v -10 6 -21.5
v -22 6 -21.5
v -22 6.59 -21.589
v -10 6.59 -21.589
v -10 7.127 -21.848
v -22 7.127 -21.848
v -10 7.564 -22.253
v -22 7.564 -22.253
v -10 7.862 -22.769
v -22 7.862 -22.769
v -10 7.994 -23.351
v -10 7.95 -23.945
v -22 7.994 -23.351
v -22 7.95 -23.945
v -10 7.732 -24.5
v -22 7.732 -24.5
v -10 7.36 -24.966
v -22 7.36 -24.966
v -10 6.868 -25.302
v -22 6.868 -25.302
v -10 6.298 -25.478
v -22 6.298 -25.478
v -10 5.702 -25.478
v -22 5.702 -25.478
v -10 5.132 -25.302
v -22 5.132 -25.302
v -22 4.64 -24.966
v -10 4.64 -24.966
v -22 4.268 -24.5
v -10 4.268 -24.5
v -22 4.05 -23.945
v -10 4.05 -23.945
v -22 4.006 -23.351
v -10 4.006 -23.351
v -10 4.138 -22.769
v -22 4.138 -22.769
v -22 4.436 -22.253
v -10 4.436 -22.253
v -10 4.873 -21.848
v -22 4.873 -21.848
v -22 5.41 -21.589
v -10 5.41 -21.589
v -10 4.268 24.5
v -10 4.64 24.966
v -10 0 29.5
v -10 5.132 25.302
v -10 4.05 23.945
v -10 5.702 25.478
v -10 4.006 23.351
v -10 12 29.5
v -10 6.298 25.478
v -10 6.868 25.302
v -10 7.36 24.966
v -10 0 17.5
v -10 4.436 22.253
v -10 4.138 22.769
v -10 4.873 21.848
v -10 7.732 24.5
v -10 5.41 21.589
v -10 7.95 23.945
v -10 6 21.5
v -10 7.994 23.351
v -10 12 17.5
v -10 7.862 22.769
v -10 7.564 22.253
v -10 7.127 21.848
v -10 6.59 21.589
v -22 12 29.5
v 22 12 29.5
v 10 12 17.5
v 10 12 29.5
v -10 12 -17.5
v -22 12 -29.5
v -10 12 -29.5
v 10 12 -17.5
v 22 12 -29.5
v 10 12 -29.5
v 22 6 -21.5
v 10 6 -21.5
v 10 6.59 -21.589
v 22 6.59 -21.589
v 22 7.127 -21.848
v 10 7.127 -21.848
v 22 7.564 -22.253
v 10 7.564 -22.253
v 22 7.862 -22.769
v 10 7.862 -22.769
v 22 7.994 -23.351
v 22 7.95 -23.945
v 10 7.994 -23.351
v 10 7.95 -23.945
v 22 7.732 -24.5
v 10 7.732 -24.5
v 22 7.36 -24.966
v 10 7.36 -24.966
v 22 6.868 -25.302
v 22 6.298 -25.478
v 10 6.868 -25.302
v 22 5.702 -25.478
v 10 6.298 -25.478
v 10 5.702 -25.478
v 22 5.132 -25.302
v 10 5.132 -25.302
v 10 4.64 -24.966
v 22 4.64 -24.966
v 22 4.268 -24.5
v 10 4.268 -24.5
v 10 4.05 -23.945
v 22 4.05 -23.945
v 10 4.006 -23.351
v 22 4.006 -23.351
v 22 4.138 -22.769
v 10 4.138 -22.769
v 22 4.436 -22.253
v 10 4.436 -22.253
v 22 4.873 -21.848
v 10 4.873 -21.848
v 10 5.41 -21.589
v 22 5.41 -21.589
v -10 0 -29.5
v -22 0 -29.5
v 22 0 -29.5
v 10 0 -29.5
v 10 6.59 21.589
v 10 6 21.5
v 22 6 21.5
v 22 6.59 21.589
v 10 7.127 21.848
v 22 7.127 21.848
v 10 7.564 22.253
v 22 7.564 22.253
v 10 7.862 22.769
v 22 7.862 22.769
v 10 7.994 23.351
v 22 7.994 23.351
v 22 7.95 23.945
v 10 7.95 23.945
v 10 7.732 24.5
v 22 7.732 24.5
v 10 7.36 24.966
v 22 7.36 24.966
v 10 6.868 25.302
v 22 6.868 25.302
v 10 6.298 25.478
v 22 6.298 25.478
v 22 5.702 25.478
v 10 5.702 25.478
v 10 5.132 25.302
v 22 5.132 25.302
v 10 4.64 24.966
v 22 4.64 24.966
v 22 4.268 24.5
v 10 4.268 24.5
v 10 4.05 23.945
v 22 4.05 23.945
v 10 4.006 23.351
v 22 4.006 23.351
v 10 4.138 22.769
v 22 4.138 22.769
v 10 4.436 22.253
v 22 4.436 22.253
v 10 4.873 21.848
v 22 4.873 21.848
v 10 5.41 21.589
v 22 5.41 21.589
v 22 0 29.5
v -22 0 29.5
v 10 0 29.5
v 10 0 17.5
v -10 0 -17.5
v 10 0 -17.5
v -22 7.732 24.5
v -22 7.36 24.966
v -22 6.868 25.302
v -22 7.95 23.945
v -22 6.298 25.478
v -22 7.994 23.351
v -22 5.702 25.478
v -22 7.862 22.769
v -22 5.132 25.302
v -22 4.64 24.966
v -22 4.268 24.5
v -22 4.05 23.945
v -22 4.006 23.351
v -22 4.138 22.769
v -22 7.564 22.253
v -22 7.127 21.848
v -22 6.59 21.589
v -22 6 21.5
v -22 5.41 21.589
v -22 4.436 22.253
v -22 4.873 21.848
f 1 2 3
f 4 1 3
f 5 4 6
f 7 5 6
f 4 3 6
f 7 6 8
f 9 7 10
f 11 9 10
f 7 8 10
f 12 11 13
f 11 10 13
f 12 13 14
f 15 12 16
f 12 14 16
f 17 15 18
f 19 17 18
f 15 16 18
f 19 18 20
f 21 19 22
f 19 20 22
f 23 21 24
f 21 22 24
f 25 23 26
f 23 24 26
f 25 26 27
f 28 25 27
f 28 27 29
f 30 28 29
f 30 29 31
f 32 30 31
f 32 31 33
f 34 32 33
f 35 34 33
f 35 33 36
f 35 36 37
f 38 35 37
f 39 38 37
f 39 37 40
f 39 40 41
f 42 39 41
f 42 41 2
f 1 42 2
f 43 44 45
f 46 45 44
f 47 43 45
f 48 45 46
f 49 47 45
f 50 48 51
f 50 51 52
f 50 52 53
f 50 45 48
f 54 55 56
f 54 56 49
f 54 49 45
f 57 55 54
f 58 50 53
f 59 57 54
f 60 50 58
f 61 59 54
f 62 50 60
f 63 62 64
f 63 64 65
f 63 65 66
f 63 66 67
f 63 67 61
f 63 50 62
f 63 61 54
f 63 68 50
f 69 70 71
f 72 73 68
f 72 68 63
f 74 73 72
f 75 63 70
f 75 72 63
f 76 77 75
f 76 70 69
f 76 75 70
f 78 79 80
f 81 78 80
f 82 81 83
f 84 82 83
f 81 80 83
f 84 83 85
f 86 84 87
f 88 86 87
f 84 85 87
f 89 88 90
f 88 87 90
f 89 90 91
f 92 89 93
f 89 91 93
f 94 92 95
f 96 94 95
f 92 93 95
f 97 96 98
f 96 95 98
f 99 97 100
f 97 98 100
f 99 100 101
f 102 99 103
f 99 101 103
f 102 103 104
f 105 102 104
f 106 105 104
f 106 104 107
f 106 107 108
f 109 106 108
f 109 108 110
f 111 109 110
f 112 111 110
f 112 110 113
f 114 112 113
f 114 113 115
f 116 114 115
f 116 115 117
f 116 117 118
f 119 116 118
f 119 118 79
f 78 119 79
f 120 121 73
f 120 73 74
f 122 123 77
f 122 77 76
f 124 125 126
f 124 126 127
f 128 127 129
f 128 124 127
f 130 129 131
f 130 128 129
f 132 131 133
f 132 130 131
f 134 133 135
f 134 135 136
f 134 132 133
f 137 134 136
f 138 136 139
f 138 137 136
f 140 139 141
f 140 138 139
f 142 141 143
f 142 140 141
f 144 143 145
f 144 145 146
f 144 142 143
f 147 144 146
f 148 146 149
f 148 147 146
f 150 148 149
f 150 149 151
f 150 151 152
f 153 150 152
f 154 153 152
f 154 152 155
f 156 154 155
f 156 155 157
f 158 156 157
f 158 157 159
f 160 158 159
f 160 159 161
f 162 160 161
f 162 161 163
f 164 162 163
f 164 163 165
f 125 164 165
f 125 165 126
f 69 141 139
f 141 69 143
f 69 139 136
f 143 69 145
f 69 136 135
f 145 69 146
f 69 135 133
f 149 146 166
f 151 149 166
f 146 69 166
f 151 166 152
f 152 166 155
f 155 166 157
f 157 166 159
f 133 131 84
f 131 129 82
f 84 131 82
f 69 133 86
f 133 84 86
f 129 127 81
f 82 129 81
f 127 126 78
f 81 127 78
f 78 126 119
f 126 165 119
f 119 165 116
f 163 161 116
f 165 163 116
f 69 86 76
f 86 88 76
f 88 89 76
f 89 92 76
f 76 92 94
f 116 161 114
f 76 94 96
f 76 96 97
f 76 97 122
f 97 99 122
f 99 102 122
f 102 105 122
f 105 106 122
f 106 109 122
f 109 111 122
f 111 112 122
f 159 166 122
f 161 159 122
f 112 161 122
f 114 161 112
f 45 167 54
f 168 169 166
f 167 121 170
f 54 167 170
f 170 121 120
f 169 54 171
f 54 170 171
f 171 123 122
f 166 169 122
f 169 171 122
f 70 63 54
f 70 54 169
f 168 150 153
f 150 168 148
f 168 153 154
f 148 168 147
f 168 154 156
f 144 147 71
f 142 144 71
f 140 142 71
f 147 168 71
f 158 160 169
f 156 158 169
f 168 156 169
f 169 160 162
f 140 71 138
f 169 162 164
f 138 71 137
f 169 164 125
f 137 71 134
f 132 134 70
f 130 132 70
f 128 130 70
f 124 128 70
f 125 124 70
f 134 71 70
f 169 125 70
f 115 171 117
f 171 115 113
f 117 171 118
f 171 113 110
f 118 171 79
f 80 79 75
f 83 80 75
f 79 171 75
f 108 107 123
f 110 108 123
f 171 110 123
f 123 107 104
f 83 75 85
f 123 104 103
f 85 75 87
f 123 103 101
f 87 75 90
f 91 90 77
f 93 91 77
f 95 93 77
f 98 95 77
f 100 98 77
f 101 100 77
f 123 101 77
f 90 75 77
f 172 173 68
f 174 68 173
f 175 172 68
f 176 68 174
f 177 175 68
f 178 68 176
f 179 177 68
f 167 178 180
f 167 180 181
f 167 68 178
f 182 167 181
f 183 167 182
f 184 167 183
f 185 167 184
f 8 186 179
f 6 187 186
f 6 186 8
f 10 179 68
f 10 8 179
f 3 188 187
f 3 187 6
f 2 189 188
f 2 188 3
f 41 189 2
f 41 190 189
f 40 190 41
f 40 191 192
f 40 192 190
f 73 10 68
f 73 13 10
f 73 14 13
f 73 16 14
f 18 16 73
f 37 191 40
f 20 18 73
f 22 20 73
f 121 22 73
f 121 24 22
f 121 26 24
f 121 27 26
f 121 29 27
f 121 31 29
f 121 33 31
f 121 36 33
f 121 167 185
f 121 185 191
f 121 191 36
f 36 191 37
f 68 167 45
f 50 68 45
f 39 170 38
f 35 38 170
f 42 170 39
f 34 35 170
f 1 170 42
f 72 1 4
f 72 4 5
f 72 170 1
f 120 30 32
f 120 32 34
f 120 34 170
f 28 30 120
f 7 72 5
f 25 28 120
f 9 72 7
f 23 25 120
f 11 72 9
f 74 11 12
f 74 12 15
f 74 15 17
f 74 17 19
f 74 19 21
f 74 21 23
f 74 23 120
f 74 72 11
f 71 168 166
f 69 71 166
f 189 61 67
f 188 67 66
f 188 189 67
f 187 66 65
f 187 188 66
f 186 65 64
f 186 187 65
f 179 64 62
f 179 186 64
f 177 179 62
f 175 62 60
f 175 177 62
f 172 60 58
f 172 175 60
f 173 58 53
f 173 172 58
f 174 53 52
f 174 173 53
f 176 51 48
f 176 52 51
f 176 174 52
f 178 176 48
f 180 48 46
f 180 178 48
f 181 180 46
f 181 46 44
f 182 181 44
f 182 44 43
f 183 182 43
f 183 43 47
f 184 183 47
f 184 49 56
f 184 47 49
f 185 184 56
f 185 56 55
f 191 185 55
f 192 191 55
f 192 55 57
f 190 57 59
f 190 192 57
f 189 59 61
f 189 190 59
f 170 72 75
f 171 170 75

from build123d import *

# Parameters (mm, degrees)
SKETCH1_W           = 44
SKETCH1_H           = 59
BOSS_EXTRUDE1_DEPTH = 12
CUT_EXTRUDE1_REACH  = 40.707
SKETCH2_W           = 20
SKETCH2_H           = 12
CUT_EXTRUDE2_REACH  = 56.316
SKETCH3_R           = 2


with BuildPart() as part:
    # Sketch1 → Boss-Extrude1 (new body)
    with BuildSketch(Plane(origin=(0, 0, 0), x_dir=(1, 0, 0), z_dir=(0, 1, 0))):
        Rectangle(SKETCH1_W, SKETCH1_H)
    extrude(amount=BOSS_EXTRUDE1_DEPTH)

    # Sketch2 → Cut-Extrude1 (cut, up to next)
    with BuildSketch(Plane(origin=(0, 12, 0), x_dir=(1, 0, 0), z_dir=(0, 1, 0)), mode=Mode.PRIVATE) as cut_extrude1_sk1:
        with Locations((0, 23.5)):
            Rectangle(SKETCH2_W, SKETCH2_H)
    cut_extrude1_tool1 = extrude(cut_extrude1_sk1.sketch, amount=-CUT_EXTRUDE1_REACH, mode=Mode.PRIVATE) & part.part
    # Sketch2 → Cut-Extrude1 (cut, up to next)
    with BuildSketch(Plane(origin=(0, 12, 0), x_dir=(1, 0, 0), z_dir=(0, 1, 0)), mode=Mode.PRIVATE) as cut_extrude1_sk2:
        with Locations((0, -23.5)):
            Rectangle(SKETCH2_W, SKETCH2_H)
    cut_extrude1_tool2 = extrude(cut_extrude1_sk2.sketch, amount=-CUT_EXTRUDE1_REACH, mode=Mode.PRIVATE) & part.part
    add(cut_extrude1_tool1.solids().sort_by_distance((0, 12, -23.5))[0], mode=Mode.SUBTRACT)
    add(cut_extrude1_tool2.solids().sort_by_distance((0, 12, 23.5))[0], mode=Mode.SUBTRACT)

    # Cut-Extrude2: up to this face of the body (flat: up to its plane)
    cut_extrude2_end = Plane(part.part.faces().sort_by_distance((22, 6, 0))[0])
    # Sketch3 → Cut-Extrude2 (cut, up to the picked face)
    with BuildSketch(Plane.ZY.offset(22), mode=Mode.PRIVATE) as cut_extrude2_sk1:
        with Locations((-23.5, 6)):
            Circle(SKETCH3_R)
    cut_extrude2_tool1 = split(extrude(cut_extrude2_sk1.sketch, amount=-CUT_EXTRUDE2_REACH, mode=Mode.PRIVATE), bisect_by=cut_extrude2_end, keep=Keep.BOTH, mode=Mode.PRIVATE)
    cut_extrude2 = cut_extrude2_tool1.solids().sort_by(Axis((-22, 6, -23.5), (1, 0, 0)))[0]
    add(cut_extrude2, mode=Mode.SUBTRACT)

    # Mirror1: Cut-Extrude2 across plane
    add(cut_extrude2.mirror(Plane.XY), mode=Mode.SUBTRACT)


solid = part.part
